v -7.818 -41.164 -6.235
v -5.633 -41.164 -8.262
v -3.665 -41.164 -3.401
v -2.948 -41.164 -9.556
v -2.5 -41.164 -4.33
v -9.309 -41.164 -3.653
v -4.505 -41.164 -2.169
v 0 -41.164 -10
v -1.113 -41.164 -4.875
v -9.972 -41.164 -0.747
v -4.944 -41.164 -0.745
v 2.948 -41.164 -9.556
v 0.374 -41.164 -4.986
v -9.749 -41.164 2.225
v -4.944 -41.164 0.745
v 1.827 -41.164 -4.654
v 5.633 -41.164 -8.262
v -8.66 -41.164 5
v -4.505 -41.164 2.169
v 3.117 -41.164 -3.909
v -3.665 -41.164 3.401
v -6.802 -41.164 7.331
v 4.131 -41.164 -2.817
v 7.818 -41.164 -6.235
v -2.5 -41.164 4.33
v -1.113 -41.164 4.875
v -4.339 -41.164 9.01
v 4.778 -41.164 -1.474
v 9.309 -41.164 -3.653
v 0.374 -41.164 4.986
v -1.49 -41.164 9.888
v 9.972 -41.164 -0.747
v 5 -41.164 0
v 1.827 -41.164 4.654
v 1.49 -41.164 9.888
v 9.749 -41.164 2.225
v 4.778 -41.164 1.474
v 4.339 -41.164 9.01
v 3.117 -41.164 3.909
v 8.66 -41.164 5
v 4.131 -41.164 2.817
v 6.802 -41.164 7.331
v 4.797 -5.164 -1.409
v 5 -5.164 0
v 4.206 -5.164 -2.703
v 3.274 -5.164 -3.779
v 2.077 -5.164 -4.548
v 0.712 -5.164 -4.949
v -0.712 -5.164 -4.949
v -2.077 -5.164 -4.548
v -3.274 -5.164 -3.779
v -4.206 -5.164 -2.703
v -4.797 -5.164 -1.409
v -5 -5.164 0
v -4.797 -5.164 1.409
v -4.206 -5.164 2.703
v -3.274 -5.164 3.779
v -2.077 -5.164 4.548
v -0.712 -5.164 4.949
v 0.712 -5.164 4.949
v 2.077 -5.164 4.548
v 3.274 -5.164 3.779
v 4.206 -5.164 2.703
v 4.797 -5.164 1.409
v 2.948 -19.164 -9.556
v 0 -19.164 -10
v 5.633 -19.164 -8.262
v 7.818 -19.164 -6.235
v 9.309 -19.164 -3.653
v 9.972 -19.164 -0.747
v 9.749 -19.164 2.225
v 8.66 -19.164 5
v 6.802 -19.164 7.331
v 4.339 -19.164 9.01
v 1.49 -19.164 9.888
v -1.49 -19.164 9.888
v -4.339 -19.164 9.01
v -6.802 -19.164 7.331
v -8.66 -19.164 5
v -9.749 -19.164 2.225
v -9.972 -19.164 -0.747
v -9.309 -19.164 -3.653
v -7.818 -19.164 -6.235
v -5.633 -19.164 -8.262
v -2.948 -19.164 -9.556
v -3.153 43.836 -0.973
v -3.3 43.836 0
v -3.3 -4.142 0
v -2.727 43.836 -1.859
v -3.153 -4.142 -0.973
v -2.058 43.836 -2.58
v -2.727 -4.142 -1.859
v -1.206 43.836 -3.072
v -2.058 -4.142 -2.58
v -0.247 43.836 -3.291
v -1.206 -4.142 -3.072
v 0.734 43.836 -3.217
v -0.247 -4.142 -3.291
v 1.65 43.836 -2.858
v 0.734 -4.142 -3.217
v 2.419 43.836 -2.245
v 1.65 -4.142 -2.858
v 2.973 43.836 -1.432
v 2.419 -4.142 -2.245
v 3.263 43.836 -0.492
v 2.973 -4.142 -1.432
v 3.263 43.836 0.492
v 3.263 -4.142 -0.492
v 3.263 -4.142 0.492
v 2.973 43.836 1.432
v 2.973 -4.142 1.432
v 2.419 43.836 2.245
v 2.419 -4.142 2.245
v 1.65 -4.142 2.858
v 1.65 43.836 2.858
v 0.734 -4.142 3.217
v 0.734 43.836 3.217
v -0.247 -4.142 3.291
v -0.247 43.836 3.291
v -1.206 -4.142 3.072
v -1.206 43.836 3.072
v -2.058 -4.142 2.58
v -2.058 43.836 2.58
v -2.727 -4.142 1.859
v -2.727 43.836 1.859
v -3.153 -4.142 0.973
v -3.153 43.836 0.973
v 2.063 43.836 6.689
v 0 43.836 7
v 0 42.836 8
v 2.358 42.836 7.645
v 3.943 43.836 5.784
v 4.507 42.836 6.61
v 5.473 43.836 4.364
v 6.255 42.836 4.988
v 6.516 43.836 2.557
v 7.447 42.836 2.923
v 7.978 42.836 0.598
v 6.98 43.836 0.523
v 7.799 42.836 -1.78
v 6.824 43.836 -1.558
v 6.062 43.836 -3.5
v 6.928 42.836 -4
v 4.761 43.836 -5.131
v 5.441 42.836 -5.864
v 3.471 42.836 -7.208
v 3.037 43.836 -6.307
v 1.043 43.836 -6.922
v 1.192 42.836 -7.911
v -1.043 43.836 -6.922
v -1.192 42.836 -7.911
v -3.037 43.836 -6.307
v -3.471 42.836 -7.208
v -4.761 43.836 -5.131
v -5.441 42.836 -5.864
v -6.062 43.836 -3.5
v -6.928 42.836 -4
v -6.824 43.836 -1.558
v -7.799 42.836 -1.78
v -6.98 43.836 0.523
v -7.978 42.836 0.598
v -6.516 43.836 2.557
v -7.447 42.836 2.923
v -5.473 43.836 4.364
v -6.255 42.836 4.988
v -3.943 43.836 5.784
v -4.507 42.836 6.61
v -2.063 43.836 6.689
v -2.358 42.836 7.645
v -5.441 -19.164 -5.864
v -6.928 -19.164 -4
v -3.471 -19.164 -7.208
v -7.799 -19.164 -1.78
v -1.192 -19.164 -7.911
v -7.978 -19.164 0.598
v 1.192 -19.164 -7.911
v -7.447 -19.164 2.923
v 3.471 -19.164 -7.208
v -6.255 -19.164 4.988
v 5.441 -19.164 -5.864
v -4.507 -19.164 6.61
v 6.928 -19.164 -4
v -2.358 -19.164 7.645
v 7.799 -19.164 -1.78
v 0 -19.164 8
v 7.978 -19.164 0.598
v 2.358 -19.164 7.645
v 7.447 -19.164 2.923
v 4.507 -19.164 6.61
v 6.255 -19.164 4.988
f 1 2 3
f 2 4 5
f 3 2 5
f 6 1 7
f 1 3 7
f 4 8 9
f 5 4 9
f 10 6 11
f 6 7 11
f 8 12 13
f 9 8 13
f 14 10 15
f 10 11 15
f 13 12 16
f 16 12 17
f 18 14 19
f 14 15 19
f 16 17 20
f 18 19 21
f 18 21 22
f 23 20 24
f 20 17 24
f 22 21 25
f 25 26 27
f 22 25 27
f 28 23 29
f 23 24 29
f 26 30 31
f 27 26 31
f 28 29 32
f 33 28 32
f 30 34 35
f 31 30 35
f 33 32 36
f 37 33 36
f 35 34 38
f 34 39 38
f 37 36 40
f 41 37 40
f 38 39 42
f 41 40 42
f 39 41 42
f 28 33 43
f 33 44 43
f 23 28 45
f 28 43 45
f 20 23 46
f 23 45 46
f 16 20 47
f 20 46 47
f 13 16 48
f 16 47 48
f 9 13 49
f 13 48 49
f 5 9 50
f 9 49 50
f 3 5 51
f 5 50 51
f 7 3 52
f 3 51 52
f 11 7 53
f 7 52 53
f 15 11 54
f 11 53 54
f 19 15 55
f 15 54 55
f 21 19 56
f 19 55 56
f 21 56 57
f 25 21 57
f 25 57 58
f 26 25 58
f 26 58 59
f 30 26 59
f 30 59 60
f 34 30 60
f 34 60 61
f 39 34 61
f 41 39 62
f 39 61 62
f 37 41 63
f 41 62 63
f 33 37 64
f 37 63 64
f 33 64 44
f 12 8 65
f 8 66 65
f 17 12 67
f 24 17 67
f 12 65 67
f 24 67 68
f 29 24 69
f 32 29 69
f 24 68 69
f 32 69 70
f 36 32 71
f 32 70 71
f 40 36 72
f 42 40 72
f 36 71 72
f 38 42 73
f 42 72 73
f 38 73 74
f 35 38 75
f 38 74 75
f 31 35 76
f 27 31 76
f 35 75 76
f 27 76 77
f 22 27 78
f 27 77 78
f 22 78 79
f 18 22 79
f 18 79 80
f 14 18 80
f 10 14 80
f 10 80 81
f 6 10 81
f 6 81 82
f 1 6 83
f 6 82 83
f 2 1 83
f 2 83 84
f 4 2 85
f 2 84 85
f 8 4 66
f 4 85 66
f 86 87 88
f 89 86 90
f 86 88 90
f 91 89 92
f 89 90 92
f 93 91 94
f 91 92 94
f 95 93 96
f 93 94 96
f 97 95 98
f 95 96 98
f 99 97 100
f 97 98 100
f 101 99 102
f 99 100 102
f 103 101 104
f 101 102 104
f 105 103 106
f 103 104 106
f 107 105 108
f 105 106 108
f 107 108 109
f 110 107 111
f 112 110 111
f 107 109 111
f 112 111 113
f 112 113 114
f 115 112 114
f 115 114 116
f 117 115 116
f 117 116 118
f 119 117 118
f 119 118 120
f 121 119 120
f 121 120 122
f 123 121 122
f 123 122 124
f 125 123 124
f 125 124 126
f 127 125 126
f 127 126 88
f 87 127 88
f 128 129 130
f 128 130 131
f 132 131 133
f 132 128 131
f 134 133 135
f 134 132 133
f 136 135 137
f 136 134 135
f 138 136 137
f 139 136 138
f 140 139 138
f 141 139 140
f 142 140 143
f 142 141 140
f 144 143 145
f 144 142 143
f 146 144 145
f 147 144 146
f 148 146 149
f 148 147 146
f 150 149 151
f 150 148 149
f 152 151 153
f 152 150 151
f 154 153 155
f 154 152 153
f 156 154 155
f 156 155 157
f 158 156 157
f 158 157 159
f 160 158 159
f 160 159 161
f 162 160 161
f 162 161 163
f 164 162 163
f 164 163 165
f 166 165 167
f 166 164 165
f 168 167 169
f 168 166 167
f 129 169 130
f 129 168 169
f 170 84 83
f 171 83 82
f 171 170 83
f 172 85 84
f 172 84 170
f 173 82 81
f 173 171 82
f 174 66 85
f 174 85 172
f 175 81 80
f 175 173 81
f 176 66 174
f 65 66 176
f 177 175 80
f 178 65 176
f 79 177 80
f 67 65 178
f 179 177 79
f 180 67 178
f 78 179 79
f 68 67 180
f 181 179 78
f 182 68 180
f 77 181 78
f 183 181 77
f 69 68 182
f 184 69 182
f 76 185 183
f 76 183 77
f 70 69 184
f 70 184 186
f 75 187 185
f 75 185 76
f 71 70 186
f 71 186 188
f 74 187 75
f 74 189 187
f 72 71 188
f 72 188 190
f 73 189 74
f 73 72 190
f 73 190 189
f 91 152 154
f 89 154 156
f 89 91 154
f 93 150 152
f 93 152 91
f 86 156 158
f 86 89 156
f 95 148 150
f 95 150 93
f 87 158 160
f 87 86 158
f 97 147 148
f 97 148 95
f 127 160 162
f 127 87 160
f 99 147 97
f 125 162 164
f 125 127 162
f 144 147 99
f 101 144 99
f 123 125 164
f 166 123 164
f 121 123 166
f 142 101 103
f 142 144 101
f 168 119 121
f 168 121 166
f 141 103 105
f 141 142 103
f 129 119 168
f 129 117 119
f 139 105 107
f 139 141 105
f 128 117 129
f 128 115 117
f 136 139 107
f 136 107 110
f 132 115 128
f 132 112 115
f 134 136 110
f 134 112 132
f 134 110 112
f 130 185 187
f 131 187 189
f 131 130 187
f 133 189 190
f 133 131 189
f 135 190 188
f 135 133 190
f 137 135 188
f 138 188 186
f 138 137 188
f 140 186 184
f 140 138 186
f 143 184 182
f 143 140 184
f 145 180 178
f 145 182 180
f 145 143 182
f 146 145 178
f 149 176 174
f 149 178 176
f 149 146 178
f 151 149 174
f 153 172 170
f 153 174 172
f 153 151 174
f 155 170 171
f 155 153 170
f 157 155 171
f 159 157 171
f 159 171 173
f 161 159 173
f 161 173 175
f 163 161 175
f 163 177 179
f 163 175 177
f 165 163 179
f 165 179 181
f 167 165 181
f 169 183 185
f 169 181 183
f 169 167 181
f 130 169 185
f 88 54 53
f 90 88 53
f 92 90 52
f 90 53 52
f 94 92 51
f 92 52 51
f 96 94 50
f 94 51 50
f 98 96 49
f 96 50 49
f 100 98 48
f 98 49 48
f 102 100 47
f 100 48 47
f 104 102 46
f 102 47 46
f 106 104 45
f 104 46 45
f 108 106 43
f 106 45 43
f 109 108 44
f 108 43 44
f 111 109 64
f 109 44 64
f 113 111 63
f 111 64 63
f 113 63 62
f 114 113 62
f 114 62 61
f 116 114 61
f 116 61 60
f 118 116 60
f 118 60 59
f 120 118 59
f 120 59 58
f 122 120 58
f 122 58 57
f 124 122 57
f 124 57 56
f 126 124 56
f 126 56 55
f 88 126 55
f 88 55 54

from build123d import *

# Parameters (mm, degrees)
SKETCH_1_R             = 4
EXTRUDE_1_DEPTH        = 21.25
SKETCH_2_W             = 1
SKETCH_2_H             = 11
CHAMFER_1_SIZE         = 0.5
HOLE_WIZARD_M6_2_D     = 5
HOLE_WIZARD_M6_2_DEPTH = 18
HOLE_WIZARD_M6_2_TIP   = 1.502151548
HOLE_WIZARD_M4_1_D     = 3.3
HOLE_WIZARD_M4_1_DEPTH = 25
HOLE_WIZARD_M4_1_TIP   = 0.991420021
SCALE1_SCALE           = 2


with BuildPart() as part:
    # 草图1 → 凸台-拉伸1 (new, symmetric)
    with BuildSketch(Plane(origin=(0, 0, 0), x_dir=(1, 0, 0), z_dir=(0, 1, 0))):
        with Locations(Location((0, 0, 0), (0, 0, 270))):
            Circle(SKETCH_1_R)
    extrude(amount=EXTRUDE_1_DEPTH, both=True)

    # 草图2 → 旋转1 (revolve)
    with BuildSketch(Plane.XY, mode=Mode.PRIVATE) as revolve_1_sk:
        with Locations((4.5, -15.75)):
            Rectangle(SKETCH_2_W, SKETCH_2_H)
    revolve(revolve_1_sk.sketch.rotate(Axis((0, 21.25, 0), (0, -1, 0)), 270), axis=Axis((0, 21.25, 0), (0, -1, 0)))

    # 倒角1
    chamfer_1_edges = [part.edges().sort_by_distance(p)[0] for p in [
        (0, 21.25, -4),
    ]]
    chamfer(chamfer_1_edges, length=CHAMFER_1_SIZE)

    # M6 螺纹孔2
    with Locations(Plane(origin=(0, -21.25, 0), x_dir=(-1, 0, 0), z_dir=(0, -1, 0))):
        with Locations((0, 0)):
            Hole(HOLE_WIZARD_M6_2_D / 2, depth=HOLE_WIZARD_M6_2_DEPTH)
            with Locations((0, 0, -(HOLE_WIZARD_M6_2_DEPTH + HOLE_WIZARD_M6_2_TIP / 2))):  # 118° drill point
                Cone(0, HOLE_WIZARD_M6_2_D / 2, HOLE_WIZARD_M6_2_TIP, mode=Mode.SUBTRACT)

    # M4 螺纹孔1
    with Locations(Plane(origin=(0, 21.25, 0), x_dir=(1, 0, 0), z_dir=(0, 1, 0))):
        with Locations((0, 0)):
            Hole(HOLE_WIZARD_M4_1_D / 2, depth=HOLE_WIZARD_M4_1_DEPTH)
            with Locations((0, 0, -(HOLE_WIZARD_M4_1_DEPTH + HOLE_WIZARD_M4_1_TIP / 2))):  # 118° drill point
                Cone(0, HOLE_WIZARD_M4_1_D / 2, HOLE_WIZARD_M4_1_TIP, mode=Mode.SUBTRACT)


with BuildPart() as part_1:
    # Scale1: scaled about (0, -1.336200342, 0)
    add(part.part.scale(SCALE1_SCALE).moved(Location((0, 1.336200342, 0))))


solid = part_1.part
